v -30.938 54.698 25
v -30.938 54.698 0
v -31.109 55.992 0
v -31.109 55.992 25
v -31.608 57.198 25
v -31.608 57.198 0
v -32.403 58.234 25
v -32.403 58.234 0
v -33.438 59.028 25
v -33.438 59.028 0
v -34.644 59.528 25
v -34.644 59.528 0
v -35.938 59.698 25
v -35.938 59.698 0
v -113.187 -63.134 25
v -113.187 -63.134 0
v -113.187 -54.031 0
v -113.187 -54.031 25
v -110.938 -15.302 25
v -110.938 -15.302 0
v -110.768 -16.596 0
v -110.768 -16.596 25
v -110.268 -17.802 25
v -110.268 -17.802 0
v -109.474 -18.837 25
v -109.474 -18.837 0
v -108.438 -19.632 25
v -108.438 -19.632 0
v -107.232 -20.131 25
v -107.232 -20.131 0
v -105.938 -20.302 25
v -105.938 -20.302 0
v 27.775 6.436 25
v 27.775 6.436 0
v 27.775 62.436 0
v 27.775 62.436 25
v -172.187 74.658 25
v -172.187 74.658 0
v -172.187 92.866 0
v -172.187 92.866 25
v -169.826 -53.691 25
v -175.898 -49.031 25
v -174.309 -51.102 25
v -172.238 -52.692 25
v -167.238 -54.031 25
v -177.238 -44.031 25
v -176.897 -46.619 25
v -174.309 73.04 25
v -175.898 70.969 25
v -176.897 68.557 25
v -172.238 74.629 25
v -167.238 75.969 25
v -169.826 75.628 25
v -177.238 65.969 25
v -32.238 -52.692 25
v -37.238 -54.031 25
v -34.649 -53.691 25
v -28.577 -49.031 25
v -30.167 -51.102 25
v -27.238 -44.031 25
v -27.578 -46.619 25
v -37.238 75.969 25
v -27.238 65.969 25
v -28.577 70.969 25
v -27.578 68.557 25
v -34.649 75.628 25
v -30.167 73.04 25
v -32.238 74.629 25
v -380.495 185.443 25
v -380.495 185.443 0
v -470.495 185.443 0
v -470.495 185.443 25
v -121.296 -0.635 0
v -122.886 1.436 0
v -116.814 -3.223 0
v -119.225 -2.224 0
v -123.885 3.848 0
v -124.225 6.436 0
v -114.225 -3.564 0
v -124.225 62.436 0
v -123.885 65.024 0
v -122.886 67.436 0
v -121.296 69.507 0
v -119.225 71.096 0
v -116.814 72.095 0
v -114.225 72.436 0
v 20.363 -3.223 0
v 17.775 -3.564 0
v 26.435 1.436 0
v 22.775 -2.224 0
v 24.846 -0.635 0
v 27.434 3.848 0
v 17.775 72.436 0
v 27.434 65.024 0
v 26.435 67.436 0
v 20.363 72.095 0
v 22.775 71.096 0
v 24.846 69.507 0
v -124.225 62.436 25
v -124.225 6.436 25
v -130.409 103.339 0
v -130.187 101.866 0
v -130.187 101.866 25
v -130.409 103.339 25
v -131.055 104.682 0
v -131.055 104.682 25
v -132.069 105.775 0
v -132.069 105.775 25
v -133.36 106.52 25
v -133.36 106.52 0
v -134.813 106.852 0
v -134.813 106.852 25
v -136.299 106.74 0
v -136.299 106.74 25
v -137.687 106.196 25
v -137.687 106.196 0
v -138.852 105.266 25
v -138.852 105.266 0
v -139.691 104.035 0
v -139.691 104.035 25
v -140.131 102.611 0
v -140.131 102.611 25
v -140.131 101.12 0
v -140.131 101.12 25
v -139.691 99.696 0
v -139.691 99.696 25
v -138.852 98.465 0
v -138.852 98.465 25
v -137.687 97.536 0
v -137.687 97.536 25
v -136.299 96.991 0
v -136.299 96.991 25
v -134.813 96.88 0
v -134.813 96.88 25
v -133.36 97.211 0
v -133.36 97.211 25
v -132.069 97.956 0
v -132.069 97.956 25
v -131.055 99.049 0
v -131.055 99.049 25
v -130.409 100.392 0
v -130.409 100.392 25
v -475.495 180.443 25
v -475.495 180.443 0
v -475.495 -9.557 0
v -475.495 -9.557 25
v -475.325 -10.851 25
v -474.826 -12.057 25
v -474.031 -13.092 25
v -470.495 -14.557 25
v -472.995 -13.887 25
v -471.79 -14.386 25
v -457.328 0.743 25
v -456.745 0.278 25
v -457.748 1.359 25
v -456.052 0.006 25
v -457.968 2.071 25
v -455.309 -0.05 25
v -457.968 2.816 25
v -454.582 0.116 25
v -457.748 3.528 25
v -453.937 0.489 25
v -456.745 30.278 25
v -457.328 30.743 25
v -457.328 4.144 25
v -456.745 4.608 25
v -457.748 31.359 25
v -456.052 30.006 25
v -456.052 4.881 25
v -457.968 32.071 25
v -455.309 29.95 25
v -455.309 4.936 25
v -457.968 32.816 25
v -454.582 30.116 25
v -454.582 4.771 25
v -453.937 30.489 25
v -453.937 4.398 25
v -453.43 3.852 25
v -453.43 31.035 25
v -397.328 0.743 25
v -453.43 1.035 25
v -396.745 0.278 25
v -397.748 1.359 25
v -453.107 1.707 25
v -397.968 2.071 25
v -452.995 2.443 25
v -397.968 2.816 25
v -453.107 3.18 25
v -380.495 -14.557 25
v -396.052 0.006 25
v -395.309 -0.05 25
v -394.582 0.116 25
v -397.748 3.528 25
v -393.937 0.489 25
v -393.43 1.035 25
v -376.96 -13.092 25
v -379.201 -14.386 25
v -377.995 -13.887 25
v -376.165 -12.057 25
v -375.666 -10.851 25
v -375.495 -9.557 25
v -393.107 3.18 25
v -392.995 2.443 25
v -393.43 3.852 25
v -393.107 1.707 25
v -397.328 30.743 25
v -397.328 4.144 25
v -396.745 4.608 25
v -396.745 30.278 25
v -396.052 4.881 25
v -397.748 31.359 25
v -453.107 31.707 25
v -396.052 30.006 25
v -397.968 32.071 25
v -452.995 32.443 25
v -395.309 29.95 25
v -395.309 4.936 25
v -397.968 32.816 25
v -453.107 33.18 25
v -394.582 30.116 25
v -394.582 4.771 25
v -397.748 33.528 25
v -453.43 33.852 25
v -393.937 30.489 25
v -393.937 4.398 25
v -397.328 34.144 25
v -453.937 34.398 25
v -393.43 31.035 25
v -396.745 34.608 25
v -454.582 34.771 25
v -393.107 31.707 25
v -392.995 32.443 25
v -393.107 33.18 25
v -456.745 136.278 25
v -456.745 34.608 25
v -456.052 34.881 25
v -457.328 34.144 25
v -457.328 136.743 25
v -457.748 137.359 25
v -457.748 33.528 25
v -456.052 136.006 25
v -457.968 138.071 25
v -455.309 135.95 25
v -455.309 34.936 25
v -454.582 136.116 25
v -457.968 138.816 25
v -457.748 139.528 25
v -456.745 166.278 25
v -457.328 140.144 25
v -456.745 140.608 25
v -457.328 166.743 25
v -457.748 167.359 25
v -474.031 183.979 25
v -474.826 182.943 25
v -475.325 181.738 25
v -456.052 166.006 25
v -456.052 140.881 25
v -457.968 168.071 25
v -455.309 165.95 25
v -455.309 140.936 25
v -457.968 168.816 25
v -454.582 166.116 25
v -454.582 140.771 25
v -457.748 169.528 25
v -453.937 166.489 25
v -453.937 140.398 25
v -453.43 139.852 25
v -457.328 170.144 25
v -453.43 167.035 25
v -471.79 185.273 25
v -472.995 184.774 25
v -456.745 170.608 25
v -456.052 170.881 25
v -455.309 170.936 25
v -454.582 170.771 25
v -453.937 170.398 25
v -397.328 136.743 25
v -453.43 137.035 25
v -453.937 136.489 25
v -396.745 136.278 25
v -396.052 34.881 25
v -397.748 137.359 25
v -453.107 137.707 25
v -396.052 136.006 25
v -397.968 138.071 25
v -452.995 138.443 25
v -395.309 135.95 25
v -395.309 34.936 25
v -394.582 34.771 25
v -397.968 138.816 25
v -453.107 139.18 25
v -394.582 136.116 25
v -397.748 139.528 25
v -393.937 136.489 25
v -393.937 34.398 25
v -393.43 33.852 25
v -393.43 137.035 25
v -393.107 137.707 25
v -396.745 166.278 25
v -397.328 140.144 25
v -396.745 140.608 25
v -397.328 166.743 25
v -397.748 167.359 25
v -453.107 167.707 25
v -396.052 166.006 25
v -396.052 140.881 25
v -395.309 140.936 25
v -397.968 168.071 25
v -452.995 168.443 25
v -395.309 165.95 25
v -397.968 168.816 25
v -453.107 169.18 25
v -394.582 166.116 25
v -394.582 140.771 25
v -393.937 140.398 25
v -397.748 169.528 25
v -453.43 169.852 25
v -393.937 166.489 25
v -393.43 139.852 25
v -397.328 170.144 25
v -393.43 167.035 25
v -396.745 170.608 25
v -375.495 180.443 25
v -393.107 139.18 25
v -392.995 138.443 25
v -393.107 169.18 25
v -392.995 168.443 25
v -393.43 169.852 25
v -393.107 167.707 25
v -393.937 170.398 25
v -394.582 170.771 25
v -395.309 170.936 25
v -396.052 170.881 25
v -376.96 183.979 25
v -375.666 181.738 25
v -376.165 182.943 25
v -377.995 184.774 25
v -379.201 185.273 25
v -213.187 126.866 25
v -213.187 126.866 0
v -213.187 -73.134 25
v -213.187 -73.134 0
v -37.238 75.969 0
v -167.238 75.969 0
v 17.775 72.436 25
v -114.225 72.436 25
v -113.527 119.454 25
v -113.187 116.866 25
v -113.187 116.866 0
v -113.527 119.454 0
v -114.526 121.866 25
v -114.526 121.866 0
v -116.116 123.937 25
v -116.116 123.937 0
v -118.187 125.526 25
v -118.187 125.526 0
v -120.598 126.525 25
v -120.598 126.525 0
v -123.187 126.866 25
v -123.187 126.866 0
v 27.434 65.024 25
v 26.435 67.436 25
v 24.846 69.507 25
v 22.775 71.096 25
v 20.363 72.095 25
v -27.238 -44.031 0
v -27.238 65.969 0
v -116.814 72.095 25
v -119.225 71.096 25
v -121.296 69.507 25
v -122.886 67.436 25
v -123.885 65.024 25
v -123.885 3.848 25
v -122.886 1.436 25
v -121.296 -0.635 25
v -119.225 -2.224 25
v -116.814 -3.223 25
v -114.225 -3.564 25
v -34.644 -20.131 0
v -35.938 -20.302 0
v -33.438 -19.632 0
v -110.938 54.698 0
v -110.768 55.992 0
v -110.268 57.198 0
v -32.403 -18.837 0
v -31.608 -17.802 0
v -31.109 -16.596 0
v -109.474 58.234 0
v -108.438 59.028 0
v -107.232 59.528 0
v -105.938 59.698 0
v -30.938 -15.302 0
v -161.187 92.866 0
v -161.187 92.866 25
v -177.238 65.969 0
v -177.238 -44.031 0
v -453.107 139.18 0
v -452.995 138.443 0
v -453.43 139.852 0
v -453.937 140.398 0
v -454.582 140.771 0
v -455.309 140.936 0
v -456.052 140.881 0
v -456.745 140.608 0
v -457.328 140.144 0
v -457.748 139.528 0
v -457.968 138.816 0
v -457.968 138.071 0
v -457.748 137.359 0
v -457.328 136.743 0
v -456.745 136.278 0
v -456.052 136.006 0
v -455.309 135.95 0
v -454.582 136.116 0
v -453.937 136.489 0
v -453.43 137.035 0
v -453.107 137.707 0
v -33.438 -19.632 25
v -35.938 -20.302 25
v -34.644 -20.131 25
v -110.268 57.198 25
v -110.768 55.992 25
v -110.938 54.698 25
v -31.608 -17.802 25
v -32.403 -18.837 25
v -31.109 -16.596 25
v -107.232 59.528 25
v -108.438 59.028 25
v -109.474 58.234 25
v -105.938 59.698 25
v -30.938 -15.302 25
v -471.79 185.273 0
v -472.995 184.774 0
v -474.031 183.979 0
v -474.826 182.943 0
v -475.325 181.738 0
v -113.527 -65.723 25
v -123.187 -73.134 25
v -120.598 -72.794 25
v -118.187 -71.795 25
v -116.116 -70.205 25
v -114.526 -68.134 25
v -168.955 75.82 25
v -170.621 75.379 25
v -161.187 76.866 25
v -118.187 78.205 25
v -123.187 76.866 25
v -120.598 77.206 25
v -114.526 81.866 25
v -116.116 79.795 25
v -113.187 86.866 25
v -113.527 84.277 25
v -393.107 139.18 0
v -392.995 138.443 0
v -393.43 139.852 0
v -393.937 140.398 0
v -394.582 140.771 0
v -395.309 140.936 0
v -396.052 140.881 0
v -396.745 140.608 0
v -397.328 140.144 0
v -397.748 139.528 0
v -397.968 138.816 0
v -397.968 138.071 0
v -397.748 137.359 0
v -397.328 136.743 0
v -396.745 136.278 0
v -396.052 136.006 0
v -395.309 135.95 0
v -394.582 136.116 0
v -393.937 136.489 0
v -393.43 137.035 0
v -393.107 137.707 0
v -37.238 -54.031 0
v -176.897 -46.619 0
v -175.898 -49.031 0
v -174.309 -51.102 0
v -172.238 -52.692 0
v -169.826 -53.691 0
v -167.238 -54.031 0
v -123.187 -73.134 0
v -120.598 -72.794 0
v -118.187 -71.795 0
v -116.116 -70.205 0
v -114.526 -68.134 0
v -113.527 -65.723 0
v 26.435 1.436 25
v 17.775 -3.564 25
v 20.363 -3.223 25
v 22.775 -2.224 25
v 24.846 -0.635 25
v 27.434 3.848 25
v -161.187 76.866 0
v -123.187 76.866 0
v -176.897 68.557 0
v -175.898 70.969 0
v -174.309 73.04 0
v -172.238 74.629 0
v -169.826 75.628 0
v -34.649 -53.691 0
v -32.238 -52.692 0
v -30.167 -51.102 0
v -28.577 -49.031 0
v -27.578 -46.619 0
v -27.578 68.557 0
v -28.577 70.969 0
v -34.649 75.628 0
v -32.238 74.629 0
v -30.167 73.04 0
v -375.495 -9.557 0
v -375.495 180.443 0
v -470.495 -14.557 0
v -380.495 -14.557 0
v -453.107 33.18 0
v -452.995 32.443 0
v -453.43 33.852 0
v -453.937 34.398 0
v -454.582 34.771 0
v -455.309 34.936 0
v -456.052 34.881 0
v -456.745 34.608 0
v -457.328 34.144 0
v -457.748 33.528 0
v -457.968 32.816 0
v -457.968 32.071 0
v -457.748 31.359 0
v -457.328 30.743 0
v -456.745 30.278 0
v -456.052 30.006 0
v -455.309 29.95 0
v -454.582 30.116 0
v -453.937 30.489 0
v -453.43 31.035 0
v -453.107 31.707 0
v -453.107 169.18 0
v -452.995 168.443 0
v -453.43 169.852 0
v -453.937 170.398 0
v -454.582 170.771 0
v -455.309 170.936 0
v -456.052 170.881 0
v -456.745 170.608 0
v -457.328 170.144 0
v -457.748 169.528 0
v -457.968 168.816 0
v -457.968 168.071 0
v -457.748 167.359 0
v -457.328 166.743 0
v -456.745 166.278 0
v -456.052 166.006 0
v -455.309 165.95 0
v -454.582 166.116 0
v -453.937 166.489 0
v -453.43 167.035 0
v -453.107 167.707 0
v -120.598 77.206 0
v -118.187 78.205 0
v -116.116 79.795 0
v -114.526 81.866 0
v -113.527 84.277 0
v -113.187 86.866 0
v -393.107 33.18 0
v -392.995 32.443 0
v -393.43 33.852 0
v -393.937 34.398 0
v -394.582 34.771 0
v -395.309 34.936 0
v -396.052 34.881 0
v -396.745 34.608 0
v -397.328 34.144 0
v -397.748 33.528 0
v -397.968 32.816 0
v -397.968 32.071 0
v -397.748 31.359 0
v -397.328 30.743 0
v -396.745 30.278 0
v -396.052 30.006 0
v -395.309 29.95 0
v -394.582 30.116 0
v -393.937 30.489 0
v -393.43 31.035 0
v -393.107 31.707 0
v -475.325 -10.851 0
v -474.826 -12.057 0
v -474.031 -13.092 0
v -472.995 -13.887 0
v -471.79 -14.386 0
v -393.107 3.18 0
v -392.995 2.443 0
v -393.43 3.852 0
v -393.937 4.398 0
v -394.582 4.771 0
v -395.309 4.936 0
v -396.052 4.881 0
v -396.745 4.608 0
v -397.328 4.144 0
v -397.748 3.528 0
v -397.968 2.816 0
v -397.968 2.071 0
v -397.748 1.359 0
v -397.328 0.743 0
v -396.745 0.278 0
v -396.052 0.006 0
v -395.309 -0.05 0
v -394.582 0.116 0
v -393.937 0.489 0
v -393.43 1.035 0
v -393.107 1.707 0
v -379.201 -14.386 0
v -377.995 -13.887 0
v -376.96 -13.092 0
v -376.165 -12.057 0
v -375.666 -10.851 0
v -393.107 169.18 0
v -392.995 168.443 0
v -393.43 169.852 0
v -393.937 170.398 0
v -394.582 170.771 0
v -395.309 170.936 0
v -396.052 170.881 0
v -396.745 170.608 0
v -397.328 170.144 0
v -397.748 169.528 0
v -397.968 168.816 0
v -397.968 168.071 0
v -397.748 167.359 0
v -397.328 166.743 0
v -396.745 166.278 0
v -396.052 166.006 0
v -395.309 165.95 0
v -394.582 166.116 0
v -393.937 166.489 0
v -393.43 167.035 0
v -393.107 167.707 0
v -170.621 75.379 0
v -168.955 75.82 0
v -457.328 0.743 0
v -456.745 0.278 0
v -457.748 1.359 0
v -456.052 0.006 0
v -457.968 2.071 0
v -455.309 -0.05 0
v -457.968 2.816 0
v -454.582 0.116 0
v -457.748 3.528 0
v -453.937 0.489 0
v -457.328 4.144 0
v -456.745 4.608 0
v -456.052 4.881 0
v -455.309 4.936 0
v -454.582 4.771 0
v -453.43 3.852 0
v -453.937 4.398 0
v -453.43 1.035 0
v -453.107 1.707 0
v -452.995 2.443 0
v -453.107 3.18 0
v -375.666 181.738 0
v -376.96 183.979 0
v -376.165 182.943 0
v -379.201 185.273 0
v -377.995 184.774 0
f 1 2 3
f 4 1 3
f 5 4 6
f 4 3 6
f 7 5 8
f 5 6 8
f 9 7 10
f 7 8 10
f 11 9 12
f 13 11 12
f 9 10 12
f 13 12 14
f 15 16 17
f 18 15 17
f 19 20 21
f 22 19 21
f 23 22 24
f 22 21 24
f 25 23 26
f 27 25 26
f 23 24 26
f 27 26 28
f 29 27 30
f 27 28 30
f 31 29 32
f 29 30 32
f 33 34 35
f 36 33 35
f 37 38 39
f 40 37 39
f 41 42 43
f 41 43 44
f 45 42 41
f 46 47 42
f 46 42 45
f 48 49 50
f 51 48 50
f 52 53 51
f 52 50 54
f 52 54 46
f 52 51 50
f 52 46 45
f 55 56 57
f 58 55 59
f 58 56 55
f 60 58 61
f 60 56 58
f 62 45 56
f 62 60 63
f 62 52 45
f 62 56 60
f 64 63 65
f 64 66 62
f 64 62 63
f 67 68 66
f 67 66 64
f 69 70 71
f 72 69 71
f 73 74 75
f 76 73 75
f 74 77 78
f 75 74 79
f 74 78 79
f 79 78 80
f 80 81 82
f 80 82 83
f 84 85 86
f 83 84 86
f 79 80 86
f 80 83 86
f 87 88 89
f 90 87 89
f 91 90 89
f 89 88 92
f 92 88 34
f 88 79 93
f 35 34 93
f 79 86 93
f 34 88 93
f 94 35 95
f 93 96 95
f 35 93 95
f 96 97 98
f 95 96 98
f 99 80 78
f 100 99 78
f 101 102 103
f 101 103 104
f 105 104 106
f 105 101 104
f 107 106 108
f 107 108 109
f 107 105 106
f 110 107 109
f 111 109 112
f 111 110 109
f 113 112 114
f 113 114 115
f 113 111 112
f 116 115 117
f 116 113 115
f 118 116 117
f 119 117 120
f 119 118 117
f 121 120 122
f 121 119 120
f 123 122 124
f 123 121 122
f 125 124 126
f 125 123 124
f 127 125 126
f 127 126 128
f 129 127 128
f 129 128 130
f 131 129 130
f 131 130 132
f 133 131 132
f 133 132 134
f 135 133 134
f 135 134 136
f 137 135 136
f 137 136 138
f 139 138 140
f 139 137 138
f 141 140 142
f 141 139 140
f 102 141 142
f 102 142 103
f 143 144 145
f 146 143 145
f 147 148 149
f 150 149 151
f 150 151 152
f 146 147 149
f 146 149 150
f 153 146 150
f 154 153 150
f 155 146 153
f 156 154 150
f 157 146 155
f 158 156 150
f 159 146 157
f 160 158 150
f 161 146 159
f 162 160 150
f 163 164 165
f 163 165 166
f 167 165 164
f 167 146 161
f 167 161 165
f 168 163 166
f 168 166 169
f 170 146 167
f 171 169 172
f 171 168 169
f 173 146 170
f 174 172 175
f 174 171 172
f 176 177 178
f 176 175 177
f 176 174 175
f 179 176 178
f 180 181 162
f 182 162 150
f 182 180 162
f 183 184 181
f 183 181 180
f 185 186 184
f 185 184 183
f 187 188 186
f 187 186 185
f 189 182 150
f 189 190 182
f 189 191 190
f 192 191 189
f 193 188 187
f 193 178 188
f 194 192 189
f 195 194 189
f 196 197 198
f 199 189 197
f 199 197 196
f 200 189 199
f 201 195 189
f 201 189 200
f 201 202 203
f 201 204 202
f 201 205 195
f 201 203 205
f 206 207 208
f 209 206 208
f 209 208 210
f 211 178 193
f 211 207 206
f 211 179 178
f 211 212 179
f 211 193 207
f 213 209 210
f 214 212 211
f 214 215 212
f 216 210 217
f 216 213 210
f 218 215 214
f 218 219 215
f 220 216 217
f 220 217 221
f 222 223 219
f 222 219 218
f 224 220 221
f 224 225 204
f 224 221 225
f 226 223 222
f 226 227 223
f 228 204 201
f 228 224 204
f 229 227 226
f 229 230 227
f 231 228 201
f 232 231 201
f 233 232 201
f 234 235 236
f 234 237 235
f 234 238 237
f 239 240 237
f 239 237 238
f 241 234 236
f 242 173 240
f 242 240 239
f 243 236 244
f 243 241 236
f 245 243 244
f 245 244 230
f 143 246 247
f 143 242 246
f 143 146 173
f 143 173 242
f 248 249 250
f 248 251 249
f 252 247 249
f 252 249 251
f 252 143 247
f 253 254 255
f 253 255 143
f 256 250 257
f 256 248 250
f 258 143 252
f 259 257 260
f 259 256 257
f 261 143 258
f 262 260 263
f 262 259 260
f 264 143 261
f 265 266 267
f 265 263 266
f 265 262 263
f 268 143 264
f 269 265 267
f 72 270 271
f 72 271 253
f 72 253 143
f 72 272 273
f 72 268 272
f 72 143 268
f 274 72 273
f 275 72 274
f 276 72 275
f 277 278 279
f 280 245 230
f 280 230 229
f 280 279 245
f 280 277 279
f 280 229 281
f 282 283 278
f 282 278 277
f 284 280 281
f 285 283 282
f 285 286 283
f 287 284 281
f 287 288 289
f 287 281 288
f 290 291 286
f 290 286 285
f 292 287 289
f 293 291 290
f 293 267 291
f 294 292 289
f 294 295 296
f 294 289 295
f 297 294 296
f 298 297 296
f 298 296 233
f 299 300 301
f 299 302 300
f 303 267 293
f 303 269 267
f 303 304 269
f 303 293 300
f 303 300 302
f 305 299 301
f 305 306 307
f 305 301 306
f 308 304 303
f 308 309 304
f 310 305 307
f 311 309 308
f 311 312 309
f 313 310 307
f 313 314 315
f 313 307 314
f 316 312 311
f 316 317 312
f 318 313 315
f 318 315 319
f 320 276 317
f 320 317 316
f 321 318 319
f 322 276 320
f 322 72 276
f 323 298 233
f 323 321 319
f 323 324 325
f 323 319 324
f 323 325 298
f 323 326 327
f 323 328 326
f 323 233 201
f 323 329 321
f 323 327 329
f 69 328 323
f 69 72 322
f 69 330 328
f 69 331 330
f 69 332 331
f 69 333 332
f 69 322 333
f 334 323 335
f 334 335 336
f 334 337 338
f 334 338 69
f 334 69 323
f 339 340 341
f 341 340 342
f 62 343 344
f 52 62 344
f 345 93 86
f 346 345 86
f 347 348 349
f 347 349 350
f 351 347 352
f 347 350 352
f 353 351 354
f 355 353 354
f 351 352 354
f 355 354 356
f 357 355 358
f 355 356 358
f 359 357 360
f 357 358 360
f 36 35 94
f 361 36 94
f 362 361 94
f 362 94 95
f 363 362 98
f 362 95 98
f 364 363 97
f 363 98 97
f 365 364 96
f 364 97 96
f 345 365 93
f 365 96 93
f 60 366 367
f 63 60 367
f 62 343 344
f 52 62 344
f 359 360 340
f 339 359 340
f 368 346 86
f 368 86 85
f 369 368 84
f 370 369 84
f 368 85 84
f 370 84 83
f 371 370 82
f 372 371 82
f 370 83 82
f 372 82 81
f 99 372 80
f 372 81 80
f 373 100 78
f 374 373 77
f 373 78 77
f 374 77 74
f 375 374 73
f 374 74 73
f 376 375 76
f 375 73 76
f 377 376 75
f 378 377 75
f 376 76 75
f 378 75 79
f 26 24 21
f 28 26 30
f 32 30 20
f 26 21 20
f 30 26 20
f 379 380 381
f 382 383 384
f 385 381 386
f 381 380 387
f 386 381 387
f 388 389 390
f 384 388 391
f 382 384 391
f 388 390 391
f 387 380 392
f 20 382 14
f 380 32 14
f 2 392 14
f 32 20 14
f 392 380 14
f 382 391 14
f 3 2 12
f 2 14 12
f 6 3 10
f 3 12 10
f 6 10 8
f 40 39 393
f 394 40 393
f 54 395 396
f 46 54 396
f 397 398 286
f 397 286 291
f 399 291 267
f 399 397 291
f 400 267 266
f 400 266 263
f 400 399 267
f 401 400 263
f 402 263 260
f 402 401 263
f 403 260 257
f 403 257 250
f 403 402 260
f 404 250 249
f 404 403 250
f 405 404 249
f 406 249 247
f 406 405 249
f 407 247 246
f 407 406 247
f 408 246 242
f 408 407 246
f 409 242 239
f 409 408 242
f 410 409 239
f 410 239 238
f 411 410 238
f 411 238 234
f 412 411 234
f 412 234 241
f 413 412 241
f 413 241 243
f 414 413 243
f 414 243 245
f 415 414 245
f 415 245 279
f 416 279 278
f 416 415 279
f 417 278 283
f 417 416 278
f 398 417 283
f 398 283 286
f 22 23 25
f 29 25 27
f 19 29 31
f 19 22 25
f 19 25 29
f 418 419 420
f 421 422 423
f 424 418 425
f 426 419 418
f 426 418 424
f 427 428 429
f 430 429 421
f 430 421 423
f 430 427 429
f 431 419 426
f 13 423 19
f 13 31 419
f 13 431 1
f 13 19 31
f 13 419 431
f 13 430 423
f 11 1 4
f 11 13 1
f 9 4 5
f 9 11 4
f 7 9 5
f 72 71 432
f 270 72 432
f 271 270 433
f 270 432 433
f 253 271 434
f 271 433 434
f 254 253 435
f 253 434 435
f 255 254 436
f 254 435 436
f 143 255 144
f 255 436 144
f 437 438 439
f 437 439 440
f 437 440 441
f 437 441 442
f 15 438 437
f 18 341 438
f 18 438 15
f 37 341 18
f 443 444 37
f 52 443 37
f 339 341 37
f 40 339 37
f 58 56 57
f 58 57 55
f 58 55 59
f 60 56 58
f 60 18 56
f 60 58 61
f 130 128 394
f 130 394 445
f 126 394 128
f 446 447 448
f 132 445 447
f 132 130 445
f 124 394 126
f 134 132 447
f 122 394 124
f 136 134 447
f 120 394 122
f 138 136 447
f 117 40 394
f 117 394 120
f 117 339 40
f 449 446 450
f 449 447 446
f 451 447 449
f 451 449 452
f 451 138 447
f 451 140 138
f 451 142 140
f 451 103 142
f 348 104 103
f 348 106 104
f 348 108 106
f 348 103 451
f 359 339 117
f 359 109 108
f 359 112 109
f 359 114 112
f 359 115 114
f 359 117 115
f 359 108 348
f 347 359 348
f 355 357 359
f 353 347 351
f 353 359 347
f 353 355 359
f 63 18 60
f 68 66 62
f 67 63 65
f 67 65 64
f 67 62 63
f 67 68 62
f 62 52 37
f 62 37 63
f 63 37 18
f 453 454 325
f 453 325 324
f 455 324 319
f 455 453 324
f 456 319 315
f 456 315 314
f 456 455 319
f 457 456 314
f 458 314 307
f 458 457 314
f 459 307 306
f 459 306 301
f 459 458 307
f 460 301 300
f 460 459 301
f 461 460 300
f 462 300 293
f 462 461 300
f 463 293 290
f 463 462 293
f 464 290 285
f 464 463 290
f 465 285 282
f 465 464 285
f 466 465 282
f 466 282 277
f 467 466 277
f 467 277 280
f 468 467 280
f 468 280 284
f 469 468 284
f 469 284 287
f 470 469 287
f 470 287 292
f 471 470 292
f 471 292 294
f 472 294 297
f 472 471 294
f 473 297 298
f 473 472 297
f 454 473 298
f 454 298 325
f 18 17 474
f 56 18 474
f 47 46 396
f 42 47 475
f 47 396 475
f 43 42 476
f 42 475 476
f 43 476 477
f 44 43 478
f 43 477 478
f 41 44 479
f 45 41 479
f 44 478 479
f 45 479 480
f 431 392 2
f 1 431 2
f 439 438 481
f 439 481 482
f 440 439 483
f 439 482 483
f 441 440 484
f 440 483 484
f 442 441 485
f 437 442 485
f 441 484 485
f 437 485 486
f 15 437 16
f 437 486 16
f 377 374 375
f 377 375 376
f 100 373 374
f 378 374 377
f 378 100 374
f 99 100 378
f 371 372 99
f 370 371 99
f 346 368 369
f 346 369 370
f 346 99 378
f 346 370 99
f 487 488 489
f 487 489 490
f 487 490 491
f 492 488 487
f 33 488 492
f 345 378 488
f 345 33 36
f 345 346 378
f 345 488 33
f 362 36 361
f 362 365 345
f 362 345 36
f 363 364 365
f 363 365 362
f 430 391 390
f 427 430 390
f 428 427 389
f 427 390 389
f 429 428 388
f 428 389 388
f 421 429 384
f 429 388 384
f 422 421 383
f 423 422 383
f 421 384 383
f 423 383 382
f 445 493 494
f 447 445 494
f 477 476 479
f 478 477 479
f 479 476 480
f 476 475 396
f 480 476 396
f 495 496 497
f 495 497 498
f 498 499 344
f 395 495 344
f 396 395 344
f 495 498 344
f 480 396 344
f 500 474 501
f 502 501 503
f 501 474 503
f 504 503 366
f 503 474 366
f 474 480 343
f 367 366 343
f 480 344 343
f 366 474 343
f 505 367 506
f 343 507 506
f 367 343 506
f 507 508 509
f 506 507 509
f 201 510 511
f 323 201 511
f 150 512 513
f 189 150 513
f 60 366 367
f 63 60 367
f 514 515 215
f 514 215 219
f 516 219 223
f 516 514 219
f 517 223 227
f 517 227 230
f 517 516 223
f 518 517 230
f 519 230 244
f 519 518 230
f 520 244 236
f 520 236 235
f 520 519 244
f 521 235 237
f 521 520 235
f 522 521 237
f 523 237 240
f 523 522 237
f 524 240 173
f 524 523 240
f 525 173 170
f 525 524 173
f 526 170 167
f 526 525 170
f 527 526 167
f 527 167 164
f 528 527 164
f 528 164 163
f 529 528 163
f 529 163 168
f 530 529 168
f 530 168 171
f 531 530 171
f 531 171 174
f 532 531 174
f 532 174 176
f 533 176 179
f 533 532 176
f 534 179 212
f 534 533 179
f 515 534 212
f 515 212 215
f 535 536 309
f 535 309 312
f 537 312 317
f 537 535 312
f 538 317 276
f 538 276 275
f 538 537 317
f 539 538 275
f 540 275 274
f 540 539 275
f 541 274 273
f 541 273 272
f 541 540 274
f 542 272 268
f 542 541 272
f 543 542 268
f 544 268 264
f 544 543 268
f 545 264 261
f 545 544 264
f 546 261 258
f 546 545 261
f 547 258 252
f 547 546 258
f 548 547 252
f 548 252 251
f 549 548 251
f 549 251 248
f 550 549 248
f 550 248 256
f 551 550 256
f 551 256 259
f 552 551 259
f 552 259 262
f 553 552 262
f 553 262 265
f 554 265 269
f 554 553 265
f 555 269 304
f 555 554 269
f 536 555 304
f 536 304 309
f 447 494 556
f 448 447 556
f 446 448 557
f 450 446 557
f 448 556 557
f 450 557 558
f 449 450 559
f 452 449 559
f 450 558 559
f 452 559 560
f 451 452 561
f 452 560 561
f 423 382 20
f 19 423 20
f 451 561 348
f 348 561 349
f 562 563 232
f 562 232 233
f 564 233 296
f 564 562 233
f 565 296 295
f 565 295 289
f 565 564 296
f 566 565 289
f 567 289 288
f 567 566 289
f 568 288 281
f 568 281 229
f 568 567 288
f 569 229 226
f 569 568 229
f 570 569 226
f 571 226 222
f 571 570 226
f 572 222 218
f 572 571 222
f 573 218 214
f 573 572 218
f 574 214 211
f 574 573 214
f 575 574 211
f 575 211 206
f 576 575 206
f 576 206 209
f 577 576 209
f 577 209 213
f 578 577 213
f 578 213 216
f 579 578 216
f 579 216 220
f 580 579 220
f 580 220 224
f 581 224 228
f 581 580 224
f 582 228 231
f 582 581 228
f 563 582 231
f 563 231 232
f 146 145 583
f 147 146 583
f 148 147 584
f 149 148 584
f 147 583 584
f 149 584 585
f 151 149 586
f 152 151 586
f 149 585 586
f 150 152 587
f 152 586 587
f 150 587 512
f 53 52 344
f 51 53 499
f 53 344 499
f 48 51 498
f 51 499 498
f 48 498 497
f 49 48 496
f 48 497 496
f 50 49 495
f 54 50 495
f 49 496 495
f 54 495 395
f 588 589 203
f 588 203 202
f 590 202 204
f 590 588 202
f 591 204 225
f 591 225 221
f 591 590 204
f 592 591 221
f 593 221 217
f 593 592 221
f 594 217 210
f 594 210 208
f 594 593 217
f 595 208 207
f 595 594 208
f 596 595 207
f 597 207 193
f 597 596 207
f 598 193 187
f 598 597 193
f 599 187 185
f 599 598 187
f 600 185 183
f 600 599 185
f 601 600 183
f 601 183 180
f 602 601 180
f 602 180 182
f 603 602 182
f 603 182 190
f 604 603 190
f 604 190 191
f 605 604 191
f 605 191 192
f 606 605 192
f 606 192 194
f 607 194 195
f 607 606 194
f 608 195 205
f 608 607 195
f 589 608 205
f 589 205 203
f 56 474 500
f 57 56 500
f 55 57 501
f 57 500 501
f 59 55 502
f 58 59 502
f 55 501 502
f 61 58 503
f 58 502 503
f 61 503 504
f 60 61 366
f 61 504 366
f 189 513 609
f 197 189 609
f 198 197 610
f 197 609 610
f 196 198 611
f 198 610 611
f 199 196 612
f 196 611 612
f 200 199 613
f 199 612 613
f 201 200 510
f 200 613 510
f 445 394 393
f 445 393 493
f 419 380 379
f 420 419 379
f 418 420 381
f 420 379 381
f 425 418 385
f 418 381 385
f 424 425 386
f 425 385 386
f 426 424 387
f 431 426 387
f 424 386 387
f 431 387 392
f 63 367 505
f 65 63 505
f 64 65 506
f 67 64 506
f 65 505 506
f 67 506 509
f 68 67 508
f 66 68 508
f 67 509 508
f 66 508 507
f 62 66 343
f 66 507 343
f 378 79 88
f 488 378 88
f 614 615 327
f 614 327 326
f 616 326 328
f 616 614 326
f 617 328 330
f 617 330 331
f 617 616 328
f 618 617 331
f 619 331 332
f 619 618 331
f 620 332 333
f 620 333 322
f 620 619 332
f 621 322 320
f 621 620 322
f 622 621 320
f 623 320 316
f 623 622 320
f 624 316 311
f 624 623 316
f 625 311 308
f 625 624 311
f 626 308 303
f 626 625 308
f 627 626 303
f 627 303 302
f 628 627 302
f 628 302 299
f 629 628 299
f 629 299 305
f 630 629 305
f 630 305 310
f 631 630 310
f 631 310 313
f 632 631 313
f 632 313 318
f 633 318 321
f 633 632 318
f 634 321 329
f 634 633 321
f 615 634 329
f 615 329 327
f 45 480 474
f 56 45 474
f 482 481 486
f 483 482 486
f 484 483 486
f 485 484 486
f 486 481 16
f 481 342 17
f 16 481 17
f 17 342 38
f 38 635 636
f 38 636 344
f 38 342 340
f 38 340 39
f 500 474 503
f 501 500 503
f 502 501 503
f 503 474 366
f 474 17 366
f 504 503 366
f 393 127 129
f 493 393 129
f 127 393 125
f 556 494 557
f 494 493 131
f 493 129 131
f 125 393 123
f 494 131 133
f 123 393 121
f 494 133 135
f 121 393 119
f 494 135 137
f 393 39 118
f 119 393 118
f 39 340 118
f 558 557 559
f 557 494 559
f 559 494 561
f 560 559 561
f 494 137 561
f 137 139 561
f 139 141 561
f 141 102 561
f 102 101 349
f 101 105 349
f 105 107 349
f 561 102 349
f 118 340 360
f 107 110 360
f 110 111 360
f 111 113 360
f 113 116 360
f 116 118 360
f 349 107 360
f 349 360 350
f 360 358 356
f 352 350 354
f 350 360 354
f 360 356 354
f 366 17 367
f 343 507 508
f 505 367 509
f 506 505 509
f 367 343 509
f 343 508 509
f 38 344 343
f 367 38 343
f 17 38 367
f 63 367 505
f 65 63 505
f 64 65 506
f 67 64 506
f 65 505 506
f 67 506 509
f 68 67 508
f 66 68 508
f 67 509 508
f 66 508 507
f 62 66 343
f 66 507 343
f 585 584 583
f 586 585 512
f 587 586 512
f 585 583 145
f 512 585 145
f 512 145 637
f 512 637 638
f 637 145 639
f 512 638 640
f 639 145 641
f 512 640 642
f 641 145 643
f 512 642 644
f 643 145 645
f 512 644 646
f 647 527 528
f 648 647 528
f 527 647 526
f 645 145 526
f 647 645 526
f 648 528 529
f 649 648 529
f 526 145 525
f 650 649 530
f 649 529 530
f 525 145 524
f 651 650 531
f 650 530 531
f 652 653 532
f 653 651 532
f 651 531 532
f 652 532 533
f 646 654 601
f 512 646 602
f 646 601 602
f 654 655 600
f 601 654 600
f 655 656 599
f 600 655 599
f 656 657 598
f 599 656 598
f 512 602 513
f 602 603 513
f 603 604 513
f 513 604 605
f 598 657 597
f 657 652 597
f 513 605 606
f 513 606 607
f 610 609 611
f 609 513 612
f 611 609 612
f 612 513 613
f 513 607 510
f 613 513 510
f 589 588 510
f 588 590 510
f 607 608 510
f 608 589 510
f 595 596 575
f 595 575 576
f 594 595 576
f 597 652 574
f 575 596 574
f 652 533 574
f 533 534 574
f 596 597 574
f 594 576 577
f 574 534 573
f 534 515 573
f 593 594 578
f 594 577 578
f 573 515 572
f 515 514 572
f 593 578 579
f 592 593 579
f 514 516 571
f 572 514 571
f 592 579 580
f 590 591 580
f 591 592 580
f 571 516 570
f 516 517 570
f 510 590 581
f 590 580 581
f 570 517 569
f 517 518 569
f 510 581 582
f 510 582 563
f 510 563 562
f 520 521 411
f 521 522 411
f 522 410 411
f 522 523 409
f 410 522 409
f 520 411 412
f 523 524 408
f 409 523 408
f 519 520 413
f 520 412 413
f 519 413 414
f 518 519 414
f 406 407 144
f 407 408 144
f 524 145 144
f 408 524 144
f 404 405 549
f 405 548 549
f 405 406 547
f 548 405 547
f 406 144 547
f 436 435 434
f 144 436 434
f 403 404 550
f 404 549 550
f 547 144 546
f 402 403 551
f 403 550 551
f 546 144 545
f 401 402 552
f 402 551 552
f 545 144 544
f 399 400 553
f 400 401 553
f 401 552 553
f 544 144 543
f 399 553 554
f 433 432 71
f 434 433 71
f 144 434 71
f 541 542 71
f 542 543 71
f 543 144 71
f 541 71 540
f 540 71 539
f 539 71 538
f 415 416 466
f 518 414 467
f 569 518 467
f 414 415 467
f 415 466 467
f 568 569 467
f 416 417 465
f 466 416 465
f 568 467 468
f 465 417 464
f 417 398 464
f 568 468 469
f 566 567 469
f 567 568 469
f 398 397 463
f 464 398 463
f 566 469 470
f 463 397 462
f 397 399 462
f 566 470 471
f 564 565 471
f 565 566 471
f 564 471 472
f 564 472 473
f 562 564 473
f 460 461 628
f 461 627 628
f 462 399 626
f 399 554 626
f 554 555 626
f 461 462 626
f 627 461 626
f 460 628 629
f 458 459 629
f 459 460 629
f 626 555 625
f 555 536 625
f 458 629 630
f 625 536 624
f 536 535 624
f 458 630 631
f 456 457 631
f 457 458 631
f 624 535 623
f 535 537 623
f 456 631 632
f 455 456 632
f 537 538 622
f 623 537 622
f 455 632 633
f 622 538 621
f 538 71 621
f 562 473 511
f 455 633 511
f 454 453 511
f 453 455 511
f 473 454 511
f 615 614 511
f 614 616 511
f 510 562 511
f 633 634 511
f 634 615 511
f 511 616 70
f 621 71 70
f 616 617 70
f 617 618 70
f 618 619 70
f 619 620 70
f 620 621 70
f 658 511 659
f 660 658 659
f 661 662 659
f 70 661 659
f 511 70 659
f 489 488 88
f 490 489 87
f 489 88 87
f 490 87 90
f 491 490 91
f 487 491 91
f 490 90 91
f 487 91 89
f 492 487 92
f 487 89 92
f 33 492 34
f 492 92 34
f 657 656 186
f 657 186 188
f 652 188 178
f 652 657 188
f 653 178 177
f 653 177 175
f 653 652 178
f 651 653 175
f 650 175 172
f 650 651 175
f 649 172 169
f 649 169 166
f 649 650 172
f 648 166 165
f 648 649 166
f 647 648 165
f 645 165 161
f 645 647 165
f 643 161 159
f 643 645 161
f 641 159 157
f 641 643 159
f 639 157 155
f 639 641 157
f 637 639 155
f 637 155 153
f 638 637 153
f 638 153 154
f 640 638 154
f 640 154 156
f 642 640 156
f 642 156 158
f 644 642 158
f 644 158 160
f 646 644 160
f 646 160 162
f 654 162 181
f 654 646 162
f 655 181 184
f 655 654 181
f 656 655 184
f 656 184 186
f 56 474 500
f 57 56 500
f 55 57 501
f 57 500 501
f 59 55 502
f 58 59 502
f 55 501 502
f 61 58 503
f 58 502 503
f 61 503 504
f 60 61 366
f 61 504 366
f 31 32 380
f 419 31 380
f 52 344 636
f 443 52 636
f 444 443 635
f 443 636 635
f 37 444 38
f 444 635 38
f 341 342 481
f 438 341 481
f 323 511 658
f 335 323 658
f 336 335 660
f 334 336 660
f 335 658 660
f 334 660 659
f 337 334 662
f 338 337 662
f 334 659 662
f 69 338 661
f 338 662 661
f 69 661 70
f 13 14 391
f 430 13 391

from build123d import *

# Parameters (mm, degrees)
F1_R      = 2.5
F2_DEPTH  = 25
F3_R      = 5
F4_DEPTH  = 25
F5_DEPTH  = 25
F6_DEPTH  = 25
F8_DEPTH  = 25
F10_DEPTH = 25


with BuildPart() as f2:
    # F1 (on Top) → F2 (new body)
    with BuildSketch(Plane.XY):
        with BuildLine():
            Line((-380.495468, 185.443412), (-470.495468, 185.443412))
            ThreePointArc((-470.495468, 185.443412), (-474.031002, 183.978945), (-475.495468, 180.443412))
            Line((-475.495468, 180.443412), (-475.495468, -9.556588))
            ThreePointArc((-475.495468, -9.556588), (-474.031002, -13.092122), (-470.495468, -14.556588))
            Line((-470.495468, -14.556588), (-380.495468, -14.556588))
            ThreePointArc((-380.495468, -14.556588), (-376.959934, -13.092122), (-375.495468, -9.556588))
            Line((-375.495468, -9.556588), (-375.495468, 180.443412))
            ThreePointArc((-375.495468, 180.443412), (-376.959934, 183.978945), (-380.495468, 185.443412))
        make_face()
        with Locations((-455.495468, 2.443412)):
            Circle(F1_R, mode=Mode.SUBTRACT)
        with Locations((-455.495468, 32.443412)):
            Circle(F1_R, mode=Mode.SUBTRACT)
        with Locations((-395.495468, 2.443412)):
            Circle(F1_R, mode=Mode.SUBTRACT)
        with Locations((-395.495468, 32.443412)):
            Circle(F1_R, mode=Mode.SUBTRACT)
        with Locations((-455.495468, 138.443412)):
            Circle(F1_R, mode=Mode.SUBTRACT)
        with Locations((-455.495468, 168.443412)):
            Circle(F1_R, mode=Mode.SUBTRACT)
        with Locations((-395.495468, 138.443412)):
            Circle(F1_R, mode=Mode.SUBTRACT)
        with Locations((-395.495468, 168.443412)):
            Circle(F1_R, mode=Mode.SUBTRACT)
    extrude(amount=F2_DEPTH)


with BuildPart() as f4:
    # F3 (on Top) → F4 (new body)
    with BuildSketch(Plane.XY):
        with BuildLine():
            Line((-123.186625, 126.865631), (-213.186625, 126.865631))
            Line((-213.186625, 126.865631), (-213.186625, -73.134369))
            Line((-213.186625, -73.134369), (-123.186625, -73.134369))
            ThreePointArc((-123.186625, -73.134369), (-116.115557, -70.205436), (-113.186625, -63.134369))
            Line((-113.186625, -63.134369), (-113.186625, -33.134369))
            ThreePointArc((-113.186625, -33.134369), (-116.115557, -26.063301), (-123.186625, -23.134369))
            Line((-123.186625, -23.134369), (-161.186625, -23.134369))
            Line((-161.186625, -23.134369), (-161.186625, -39.134369))
            Line((-161.186625, -39.134369), (-172.186625, -39.134369))
            Line((-172.186625, -39.134369), (-172.186625, 92.865631))
            Line((-172.186625, 92.865631), (-161.186625, 92.865631))
            Line((-161.186625, 92.865631), (-161.186625, 76.865631))
            Line((-161.186625, 76.865631), (-123.186625, 76.865631))
            ThreePointArc((-123.186625, 76.865631), (-116.115557, 79.794564), (-113.186625, 86.865631))
            Line((-113.186625, 86.865631), (-113.186625, 116.865631))
            ThreePointArc((-113.186625, 116.865631), (-116.115557, 123.936699), (-123.186625, 126.865631))
        make_face()
        with Locations((-135.186625, 101.865631)):
            Circle(F3_R, mode=Mode.SUBTRACT)
    extrude(amount=F4_DEPTH)

    # F0 (on Top) → F5 (join)
    with BuildSketch(Plane.XY):
        with BuildLine():
            Line((-37.23768, 75.968715), (-167.23768, 75.968715))
            ThreePointArc((-167.23768, 75.968715), (-174.308748, 73.039783), (-177.23768, 65.968715))
            Line((-177.23768, 65.968715), (-177.23768, -44.031285))
            ThreePointArc((-177.23768, -44.031285), (-174.308748, -51.102353), (-167.23768, -54.031285))
            Line((-167.23768, -54.031285), (-37.23768, -54.031285))
            ThreePointArc((-37.23768, -54.031285), (-30.166612, -51.102353), (-27.23768, -44.031285))
            Line((-27.23768, -44.031285), (-27.23768, 65.968715))
            ThreePointArc((-27.23768, 65.968715), (-30.166612, 73.039783), (-37.23768, 75.968715))
        make_face()
    extrude(amount=F5_DEPTH)


with BuildPart() as f6:
    # F0 (on Top) → F6 (new body)
    with BuildSketch(Plane.XY):
        with BuildLine():
            Line((-37.23768, 75.968715), (-167.23768, 75.968715))
            ThreePointArc((-167.23768, 75.968715), (-174.308748, 73.039783), (-177.23768, 65.968715))
            Line((-177.23768, 65.968715), (-177.23768, -44.031285))
            ThreePointArc((-177.23768, -44.031285), (-174.308748, -51.102353), (-167.23768, -54.031285))
            Line((-167.23768, -54.031285), (-37.23768, -54.031285))
            ThreePointArc((-37.23768, -54.031285), (-30.166612, -51.102353), (-27.23768, -44.031285))
            Line((-27.23768, -44.031285), (-27.23768, 65.968715))
            ThreePointArc((-27.23768, 65.968715), (-30.166612, 73.039783), (-37.23768, 75.968715))
        make_face()
    extrude(amount=F6_DEPTH)


with BuildPart() as f8:
    # F7 (on Top) → F8 (new body)
    with BuildSketch(Plane.XY):
        with BuildLine():
            Line((-35.938318, 59.698157), (-105.938318, 59.698157))
            ThreePointArc((-105.938318, 59.698157), (-109.473852, 58.233691), (-110.938318, 54.698157))
            Line((-110.938318, 54.698157), (-110.938318, -15.301843))
            ThreePointArc((-110.938318, -15.301843), (-109.473852, -18.837377), (-105.938318, -20.301843))
            Line((-105.938318, -20.301843), (-35.938318, -20.301843))
            ThreePointArc((-35.938318, -20.301843), (-32.402784, -18.837377), (-30.938318, -15.301843))
            Line((-30.938318, -15.301843), (-30.938318, 54.698157))
            ThreePointArc((-30.938318, 54.698157), (-32.402784, 58.233691), (-35.938318, 59.698157))
        make_face()
    extrude(amount=F8_DEPTH)


with BuildPart() as f10:
    # F9 (on Top) → F10 (new body)
    with BuildSketch(Plane.XY):
        with BuildLine():
            Line((17.774655, 72.43601), (-114.225345, 72.43601))
            ThreePointArc((-114.225345, 72.43601), (-121.296413, 69.507078), (-124.225345, 62.43601))
            Line((-124.225345, 62.43601), (-124.225345, 6.43601))
            ThreePointArc((-124.225345, 6.43601), (-121.296413, -0.635058), (-114.225345, -3.56399))
            Line((-114.225345, -3.56399), (17.774655, -3.56399))
            ThreePointArc((17.774655, -3.56399), (24.845723, -0.635058), (27.774655, 6.43601))
            Line((27.774655, 6.43601), (27.774655, 62.43601))
            ThreePointArc((27.774655, 62.43601), (24.845723, 69.507078), (17.774655, 72.43601))
        make_face()
    extrude(amount=F10_DEPTH)


solid = Compound([f2.part, f4.part, f6.part, f8.part, f10.part])
